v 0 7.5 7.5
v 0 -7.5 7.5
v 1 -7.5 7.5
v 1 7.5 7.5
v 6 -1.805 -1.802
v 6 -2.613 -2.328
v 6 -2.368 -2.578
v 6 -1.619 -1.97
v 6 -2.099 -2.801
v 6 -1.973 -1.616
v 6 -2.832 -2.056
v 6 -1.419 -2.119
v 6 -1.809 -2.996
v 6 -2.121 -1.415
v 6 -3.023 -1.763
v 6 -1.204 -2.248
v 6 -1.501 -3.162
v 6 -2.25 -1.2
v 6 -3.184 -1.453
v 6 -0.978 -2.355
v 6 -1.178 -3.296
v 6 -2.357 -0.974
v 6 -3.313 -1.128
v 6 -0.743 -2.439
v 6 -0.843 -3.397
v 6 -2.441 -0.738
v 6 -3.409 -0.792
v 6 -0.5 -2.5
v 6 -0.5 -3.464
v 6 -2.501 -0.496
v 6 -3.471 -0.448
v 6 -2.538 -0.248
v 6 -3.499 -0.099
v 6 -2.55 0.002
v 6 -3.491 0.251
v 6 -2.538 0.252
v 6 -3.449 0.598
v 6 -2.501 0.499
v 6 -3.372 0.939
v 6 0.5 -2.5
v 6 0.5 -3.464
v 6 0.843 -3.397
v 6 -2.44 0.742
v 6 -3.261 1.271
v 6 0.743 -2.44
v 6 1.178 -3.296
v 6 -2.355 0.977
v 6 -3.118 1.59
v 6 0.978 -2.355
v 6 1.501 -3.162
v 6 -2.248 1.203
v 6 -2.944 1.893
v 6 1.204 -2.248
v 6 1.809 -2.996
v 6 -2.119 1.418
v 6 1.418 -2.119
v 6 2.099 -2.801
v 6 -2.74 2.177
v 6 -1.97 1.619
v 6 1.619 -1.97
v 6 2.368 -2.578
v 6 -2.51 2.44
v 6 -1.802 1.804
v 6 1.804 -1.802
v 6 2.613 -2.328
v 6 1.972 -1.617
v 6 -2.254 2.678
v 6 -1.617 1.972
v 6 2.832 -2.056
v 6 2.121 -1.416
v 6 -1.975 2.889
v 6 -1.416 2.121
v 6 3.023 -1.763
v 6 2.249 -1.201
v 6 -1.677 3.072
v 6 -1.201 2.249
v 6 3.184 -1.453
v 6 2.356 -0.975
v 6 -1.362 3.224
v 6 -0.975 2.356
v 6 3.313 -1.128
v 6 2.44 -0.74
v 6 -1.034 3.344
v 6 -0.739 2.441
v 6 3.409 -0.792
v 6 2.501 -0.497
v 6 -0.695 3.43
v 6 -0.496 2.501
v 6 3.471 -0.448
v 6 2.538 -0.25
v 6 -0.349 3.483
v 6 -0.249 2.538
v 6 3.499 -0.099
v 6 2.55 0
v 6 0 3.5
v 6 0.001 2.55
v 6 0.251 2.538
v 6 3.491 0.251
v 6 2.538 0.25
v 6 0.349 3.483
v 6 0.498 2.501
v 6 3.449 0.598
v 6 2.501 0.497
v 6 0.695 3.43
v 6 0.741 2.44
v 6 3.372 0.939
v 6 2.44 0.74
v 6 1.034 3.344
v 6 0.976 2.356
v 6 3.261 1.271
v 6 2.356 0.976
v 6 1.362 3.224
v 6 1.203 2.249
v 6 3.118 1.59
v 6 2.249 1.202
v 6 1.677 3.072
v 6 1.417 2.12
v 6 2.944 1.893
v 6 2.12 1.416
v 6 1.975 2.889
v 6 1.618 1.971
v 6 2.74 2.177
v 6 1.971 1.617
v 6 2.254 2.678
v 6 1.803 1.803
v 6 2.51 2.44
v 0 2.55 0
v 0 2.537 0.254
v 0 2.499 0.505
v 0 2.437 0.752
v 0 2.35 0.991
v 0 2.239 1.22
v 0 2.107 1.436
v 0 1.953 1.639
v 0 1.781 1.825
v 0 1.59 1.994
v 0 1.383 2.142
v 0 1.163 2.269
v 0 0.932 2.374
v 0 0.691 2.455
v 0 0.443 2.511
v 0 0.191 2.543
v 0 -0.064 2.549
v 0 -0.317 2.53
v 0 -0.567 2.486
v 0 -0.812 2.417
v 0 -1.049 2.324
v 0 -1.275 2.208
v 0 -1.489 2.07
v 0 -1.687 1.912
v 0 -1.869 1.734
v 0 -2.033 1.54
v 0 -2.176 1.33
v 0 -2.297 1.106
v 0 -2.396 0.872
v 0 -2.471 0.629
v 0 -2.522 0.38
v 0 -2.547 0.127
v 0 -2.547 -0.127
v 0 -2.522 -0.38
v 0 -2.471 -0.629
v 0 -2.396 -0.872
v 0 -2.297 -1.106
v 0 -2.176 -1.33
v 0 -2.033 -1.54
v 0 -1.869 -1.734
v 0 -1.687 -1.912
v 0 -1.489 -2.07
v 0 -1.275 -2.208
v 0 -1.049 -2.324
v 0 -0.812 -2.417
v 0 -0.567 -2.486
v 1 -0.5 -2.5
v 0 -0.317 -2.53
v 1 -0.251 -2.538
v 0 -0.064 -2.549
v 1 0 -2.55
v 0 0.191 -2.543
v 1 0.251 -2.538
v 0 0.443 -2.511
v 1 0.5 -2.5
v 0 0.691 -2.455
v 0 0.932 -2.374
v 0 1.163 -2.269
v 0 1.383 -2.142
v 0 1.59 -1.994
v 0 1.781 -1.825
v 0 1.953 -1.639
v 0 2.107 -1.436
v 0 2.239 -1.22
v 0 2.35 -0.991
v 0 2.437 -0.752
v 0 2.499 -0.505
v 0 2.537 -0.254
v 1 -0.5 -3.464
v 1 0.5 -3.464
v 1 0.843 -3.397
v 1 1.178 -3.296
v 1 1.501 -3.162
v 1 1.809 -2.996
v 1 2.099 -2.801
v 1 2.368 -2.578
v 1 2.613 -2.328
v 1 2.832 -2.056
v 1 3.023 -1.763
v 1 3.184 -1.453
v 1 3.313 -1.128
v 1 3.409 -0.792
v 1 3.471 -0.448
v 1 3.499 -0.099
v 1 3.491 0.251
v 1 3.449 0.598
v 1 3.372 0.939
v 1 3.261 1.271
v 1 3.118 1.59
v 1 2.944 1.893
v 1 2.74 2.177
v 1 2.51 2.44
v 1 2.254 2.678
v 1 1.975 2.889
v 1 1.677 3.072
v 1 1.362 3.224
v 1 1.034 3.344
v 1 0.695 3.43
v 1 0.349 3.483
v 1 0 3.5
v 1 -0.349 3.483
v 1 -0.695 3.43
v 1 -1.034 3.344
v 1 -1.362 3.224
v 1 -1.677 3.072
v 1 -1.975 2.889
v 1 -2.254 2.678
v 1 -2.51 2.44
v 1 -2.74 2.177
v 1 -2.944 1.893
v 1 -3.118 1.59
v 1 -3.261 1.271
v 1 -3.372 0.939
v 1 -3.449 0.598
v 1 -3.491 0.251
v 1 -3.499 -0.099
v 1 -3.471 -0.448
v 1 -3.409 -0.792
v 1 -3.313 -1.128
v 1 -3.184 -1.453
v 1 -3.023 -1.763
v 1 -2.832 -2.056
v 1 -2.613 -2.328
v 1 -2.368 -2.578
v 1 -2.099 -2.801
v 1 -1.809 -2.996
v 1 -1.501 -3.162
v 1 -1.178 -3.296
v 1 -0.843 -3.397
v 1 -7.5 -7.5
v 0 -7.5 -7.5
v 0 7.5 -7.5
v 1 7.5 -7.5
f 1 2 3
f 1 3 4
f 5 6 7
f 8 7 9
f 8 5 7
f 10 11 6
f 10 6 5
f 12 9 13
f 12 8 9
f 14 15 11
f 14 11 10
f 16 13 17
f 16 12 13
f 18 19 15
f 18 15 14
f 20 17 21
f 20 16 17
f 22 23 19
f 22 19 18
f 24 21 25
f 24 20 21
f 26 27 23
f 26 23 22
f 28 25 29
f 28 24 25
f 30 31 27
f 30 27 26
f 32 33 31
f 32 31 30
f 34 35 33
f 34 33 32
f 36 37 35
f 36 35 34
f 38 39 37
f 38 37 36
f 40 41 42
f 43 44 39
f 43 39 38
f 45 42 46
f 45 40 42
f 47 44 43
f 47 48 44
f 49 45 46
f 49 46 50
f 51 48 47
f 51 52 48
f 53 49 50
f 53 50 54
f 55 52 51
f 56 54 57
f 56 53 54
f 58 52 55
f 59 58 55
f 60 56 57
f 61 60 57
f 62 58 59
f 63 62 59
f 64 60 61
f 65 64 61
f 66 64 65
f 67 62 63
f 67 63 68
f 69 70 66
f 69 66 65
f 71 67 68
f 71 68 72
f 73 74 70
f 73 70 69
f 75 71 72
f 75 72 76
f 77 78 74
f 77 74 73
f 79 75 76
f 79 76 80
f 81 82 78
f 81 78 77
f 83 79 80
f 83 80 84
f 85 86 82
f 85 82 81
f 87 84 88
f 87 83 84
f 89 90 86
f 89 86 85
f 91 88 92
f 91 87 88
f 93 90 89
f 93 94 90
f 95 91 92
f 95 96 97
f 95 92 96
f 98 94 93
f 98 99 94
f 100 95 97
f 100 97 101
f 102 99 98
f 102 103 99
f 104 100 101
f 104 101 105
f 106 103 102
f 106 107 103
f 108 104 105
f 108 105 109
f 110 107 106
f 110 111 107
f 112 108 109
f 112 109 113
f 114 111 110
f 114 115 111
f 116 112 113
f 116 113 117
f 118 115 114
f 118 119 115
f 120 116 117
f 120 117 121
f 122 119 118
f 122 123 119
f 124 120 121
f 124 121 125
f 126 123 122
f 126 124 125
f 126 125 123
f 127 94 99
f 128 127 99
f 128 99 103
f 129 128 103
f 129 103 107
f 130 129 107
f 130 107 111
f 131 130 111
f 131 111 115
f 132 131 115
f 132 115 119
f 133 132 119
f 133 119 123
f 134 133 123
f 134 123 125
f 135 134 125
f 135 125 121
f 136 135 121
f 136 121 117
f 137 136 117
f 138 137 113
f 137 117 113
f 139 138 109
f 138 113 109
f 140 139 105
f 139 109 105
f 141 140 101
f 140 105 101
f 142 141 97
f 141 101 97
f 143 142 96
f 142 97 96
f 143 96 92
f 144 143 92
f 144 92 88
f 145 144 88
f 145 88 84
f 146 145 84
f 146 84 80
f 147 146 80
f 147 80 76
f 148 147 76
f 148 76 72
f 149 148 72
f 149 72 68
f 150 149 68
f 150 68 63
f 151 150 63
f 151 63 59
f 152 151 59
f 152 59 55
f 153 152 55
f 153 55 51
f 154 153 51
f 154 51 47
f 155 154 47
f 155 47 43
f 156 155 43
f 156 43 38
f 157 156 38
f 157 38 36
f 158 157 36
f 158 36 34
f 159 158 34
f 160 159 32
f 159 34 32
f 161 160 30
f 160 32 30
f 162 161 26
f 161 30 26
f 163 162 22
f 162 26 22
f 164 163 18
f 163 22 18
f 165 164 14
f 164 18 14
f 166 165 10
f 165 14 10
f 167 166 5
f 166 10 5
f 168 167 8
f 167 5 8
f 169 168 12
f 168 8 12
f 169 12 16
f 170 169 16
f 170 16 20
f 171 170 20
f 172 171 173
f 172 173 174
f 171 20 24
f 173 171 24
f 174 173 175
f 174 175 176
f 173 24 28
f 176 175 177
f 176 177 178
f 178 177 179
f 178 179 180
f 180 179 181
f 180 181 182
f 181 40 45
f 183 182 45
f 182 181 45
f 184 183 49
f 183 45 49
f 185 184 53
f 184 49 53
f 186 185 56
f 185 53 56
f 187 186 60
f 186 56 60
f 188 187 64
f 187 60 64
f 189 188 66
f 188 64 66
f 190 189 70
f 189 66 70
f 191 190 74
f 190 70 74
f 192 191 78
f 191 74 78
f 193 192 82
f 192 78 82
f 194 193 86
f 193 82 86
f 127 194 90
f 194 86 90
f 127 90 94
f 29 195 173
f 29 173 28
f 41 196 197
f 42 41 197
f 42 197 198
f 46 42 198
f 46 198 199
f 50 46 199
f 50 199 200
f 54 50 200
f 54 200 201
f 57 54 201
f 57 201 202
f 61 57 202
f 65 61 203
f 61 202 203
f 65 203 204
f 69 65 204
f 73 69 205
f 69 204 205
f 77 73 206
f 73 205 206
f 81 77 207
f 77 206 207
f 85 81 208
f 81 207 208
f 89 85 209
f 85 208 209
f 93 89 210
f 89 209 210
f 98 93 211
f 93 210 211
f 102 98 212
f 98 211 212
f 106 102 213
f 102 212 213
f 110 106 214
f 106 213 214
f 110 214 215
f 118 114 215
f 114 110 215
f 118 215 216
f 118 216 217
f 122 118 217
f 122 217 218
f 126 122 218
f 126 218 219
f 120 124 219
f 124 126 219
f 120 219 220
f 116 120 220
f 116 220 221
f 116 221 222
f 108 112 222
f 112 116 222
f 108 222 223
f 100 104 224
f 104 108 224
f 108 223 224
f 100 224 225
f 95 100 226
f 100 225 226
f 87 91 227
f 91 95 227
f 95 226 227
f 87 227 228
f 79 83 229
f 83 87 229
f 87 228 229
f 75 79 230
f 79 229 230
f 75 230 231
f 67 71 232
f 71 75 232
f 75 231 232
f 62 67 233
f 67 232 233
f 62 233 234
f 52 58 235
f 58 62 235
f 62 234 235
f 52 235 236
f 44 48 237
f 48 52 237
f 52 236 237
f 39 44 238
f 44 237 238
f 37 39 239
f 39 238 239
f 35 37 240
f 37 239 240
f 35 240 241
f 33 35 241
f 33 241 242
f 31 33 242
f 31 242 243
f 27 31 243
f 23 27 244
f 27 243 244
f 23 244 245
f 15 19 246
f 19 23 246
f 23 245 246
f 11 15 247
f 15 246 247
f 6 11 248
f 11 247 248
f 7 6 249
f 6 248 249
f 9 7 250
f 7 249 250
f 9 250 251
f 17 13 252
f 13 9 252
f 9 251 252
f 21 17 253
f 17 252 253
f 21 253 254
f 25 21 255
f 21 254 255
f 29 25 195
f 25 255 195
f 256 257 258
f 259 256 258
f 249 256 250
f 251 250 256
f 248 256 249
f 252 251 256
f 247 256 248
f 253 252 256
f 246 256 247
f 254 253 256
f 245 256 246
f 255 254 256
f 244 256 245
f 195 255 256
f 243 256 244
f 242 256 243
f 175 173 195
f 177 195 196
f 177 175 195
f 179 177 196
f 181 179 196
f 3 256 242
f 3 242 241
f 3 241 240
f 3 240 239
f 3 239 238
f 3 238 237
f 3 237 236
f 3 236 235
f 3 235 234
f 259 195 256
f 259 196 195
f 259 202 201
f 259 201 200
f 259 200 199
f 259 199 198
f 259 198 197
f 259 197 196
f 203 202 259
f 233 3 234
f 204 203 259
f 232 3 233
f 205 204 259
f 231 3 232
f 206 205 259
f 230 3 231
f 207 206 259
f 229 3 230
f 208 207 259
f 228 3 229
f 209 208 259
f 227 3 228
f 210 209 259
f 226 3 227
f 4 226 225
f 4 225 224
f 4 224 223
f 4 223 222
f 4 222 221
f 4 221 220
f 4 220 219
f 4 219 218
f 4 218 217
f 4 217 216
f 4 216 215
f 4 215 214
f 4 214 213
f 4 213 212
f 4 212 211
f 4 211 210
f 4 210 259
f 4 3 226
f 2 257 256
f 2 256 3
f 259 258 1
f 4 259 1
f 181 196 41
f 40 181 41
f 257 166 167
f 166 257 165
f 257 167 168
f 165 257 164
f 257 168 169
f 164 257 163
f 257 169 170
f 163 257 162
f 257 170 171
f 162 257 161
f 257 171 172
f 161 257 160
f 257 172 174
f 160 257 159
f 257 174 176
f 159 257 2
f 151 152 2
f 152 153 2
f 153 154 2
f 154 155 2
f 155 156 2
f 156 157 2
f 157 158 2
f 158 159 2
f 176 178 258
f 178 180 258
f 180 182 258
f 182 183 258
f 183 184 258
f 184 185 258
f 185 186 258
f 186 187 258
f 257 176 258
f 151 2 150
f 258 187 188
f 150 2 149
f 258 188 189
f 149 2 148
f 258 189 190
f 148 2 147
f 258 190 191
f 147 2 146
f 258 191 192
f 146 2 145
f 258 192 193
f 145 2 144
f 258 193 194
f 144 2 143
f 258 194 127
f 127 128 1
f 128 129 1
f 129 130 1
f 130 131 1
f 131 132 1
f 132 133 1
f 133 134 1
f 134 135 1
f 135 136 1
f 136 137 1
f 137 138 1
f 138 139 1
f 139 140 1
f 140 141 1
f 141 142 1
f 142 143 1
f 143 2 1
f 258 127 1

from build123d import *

# Parameters (mm, degrees)
F0_W     = 15
F0_H     = 15
F1_DEPTH = 1
F2_R     = 3.5
F3_DEPTH = 5
F4_R     = 2.55
F5_DEPTH = 25
F6_W     = 5.5
F6_H     = 1
F7_DEPTH = 7


with BuildPart() as f1:
    # F0 (on Right) → F1 (new body)
    with BuildSketch(Plane.YZ):
        Rectangle(F0_W, F0_H)
    extrude(amount=F1_DEPTH)

    # F2 (on face) → F3 (join)
    with BuildSketch(Plane.YZ.offset(1)):
        Circle(F2_R)
    extrude(amount=F3_DEPTH)

    # F4 (on face) → F5 (cut)
    with BuildSketch(Plane.YZ.offset(6)):
        Circle(F4_R)
    extrude(amount=-F5_DEPTH, mode=Mode.SUBTRACT)

    # F6 (on face) → F7 (cut)
    with BuildSketch(Plane(origin=(0, 0, -7.5), x_dir=(1, 0, 0), z_dir=(0, 0, -1))):
        with Locations((3.75, 0)):
            Rectangle(F6_W, F6_H)
    extrude(amount=-F7_DEPTH, mode=Mode.SUBTRACT)


solid = f1.part
